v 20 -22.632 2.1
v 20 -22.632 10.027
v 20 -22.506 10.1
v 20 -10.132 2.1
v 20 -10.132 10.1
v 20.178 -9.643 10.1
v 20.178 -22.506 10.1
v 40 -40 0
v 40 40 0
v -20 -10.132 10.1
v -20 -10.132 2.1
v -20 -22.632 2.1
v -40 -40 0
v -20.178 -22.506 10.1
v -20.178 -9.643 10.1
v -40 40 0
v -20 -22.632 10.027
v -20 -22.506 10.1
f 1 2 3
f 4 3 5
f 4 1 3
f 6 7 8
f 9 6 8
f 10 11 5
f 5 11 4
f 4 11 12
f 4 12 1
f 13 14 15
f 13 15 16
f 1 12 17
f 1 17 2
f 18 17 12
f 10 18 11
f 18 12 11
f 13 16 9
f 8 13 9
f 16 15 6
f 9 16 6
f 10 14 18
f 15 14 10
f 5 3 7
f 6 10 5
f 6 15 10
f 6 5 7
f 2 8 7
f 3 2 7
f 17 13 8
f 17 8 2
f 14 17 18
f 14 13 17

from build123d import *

# Parameters (mm, degrees)
F0_W        = 80
F0_H        = 80
F0_W_2      = 40
F0_H_2      = 12.5
F1_DEPTH    = 10.1
F2_T1_DEPTH = 170.5154722058
F3_SIZE2    = 19.822356
F3_SIZE     = 10.09999
F3_2_SIZE2  = 19.822356
F3_2_SIZE   = 10.09999
F4_SIZE2    = 49.643076
F4_SIZE     = 10.09999
F5_DEPTH    = 2.1


# Not quite as in the source:
# - a fillet or chamfer that OpenCascade refuses, or shapes differently, is made with other operations: its cross-section is extruded or revolved along the edge and cut away or added
# - a fillet or chamfer is up to 0.001 mm smaller than in the source, because OpenCascade refuses the exact size


with BuildPart() as f1:
    # F0 (on Top) → F1 (new body)
    with BuildSketch(Plane.XY):
        Rectangle(F0_W, F0_H)
        with Locations((0, -16.3821391761)):
            Rectangle(F0_W_2, F0_H_2, mode=Mode.SUBTRACT)
    extrude(amount=F1_DEPTH)

    # F2: chamfer of 10.1 x 17.4937131564 on 1 edges, made by hand

    # F2_s2 → F2_t1 (cut)
    with BuildSketch(Plane.YZ.offset(-85.2577361029)):
        Polygon((-40, 0), (-22.5062868436, 10.1), (-40, 10.1), align=None)
    extrude(amount=F2_T1_DEPTH, mode=Mode.SUBTRACT)

    # F3 (size 10.1 and 19.8223661056 in the source; OpenCascade refuses exactly that, so slightly less here)
    f3_edges = [f1.edges().sort_by_distance(p)[0] for p in [
        (-40, 8.746857, 10.1),
    ]]
    f3_side = f1.faces().sort_by_distance((-40, 4.194471, 4.843358))[0]
    chamfer(f3_edges, length=F3_SIZE, length2=F3_SIZE2, reference=f3_side)

    # F3#2 (size 10.1 and 19.8223661056 in the source; OpenCascade refuses exactly that, so slightly less here)
    f3_2_edges = [f1.edges().sort_by_distance(p)[0] for p in [
        (40, 8.746857, 10.1),
    ]]
    f3_2_side = f1.faces().sort_by_distance((40, 4.194471, 4.843358))[0]
    chamfer(f3_2_edges, length=F3_2_SIZE, length2=F3_2_SIZE2, reference=f3_2_side)

    # F4 (size 10.1 and 49.6430860138 in the source; OpenCascade refuses exactly that, so slightly less here)
    f4_edges = [f1.edges().sort_by_distance(p)[0] for p in [
        (0, 40, 10.1),
    ]]
    f4_side = f1.faces().sort_by_distance((0, 40, 4.495514))[0]
    chamfer(f4_edges, length=F4_SIZE, length2=F4_SIZE2, reference=f4_side)

    # F0 (on Top) → F5 (join)
    with BuildSketch(Plane.XY):
        with Locations((0, -16.3821391761)):
            Rectangle(F0_W_2, F0_H_2)
    extrude(amount=F5_DEPTH)


solid = f1.part
